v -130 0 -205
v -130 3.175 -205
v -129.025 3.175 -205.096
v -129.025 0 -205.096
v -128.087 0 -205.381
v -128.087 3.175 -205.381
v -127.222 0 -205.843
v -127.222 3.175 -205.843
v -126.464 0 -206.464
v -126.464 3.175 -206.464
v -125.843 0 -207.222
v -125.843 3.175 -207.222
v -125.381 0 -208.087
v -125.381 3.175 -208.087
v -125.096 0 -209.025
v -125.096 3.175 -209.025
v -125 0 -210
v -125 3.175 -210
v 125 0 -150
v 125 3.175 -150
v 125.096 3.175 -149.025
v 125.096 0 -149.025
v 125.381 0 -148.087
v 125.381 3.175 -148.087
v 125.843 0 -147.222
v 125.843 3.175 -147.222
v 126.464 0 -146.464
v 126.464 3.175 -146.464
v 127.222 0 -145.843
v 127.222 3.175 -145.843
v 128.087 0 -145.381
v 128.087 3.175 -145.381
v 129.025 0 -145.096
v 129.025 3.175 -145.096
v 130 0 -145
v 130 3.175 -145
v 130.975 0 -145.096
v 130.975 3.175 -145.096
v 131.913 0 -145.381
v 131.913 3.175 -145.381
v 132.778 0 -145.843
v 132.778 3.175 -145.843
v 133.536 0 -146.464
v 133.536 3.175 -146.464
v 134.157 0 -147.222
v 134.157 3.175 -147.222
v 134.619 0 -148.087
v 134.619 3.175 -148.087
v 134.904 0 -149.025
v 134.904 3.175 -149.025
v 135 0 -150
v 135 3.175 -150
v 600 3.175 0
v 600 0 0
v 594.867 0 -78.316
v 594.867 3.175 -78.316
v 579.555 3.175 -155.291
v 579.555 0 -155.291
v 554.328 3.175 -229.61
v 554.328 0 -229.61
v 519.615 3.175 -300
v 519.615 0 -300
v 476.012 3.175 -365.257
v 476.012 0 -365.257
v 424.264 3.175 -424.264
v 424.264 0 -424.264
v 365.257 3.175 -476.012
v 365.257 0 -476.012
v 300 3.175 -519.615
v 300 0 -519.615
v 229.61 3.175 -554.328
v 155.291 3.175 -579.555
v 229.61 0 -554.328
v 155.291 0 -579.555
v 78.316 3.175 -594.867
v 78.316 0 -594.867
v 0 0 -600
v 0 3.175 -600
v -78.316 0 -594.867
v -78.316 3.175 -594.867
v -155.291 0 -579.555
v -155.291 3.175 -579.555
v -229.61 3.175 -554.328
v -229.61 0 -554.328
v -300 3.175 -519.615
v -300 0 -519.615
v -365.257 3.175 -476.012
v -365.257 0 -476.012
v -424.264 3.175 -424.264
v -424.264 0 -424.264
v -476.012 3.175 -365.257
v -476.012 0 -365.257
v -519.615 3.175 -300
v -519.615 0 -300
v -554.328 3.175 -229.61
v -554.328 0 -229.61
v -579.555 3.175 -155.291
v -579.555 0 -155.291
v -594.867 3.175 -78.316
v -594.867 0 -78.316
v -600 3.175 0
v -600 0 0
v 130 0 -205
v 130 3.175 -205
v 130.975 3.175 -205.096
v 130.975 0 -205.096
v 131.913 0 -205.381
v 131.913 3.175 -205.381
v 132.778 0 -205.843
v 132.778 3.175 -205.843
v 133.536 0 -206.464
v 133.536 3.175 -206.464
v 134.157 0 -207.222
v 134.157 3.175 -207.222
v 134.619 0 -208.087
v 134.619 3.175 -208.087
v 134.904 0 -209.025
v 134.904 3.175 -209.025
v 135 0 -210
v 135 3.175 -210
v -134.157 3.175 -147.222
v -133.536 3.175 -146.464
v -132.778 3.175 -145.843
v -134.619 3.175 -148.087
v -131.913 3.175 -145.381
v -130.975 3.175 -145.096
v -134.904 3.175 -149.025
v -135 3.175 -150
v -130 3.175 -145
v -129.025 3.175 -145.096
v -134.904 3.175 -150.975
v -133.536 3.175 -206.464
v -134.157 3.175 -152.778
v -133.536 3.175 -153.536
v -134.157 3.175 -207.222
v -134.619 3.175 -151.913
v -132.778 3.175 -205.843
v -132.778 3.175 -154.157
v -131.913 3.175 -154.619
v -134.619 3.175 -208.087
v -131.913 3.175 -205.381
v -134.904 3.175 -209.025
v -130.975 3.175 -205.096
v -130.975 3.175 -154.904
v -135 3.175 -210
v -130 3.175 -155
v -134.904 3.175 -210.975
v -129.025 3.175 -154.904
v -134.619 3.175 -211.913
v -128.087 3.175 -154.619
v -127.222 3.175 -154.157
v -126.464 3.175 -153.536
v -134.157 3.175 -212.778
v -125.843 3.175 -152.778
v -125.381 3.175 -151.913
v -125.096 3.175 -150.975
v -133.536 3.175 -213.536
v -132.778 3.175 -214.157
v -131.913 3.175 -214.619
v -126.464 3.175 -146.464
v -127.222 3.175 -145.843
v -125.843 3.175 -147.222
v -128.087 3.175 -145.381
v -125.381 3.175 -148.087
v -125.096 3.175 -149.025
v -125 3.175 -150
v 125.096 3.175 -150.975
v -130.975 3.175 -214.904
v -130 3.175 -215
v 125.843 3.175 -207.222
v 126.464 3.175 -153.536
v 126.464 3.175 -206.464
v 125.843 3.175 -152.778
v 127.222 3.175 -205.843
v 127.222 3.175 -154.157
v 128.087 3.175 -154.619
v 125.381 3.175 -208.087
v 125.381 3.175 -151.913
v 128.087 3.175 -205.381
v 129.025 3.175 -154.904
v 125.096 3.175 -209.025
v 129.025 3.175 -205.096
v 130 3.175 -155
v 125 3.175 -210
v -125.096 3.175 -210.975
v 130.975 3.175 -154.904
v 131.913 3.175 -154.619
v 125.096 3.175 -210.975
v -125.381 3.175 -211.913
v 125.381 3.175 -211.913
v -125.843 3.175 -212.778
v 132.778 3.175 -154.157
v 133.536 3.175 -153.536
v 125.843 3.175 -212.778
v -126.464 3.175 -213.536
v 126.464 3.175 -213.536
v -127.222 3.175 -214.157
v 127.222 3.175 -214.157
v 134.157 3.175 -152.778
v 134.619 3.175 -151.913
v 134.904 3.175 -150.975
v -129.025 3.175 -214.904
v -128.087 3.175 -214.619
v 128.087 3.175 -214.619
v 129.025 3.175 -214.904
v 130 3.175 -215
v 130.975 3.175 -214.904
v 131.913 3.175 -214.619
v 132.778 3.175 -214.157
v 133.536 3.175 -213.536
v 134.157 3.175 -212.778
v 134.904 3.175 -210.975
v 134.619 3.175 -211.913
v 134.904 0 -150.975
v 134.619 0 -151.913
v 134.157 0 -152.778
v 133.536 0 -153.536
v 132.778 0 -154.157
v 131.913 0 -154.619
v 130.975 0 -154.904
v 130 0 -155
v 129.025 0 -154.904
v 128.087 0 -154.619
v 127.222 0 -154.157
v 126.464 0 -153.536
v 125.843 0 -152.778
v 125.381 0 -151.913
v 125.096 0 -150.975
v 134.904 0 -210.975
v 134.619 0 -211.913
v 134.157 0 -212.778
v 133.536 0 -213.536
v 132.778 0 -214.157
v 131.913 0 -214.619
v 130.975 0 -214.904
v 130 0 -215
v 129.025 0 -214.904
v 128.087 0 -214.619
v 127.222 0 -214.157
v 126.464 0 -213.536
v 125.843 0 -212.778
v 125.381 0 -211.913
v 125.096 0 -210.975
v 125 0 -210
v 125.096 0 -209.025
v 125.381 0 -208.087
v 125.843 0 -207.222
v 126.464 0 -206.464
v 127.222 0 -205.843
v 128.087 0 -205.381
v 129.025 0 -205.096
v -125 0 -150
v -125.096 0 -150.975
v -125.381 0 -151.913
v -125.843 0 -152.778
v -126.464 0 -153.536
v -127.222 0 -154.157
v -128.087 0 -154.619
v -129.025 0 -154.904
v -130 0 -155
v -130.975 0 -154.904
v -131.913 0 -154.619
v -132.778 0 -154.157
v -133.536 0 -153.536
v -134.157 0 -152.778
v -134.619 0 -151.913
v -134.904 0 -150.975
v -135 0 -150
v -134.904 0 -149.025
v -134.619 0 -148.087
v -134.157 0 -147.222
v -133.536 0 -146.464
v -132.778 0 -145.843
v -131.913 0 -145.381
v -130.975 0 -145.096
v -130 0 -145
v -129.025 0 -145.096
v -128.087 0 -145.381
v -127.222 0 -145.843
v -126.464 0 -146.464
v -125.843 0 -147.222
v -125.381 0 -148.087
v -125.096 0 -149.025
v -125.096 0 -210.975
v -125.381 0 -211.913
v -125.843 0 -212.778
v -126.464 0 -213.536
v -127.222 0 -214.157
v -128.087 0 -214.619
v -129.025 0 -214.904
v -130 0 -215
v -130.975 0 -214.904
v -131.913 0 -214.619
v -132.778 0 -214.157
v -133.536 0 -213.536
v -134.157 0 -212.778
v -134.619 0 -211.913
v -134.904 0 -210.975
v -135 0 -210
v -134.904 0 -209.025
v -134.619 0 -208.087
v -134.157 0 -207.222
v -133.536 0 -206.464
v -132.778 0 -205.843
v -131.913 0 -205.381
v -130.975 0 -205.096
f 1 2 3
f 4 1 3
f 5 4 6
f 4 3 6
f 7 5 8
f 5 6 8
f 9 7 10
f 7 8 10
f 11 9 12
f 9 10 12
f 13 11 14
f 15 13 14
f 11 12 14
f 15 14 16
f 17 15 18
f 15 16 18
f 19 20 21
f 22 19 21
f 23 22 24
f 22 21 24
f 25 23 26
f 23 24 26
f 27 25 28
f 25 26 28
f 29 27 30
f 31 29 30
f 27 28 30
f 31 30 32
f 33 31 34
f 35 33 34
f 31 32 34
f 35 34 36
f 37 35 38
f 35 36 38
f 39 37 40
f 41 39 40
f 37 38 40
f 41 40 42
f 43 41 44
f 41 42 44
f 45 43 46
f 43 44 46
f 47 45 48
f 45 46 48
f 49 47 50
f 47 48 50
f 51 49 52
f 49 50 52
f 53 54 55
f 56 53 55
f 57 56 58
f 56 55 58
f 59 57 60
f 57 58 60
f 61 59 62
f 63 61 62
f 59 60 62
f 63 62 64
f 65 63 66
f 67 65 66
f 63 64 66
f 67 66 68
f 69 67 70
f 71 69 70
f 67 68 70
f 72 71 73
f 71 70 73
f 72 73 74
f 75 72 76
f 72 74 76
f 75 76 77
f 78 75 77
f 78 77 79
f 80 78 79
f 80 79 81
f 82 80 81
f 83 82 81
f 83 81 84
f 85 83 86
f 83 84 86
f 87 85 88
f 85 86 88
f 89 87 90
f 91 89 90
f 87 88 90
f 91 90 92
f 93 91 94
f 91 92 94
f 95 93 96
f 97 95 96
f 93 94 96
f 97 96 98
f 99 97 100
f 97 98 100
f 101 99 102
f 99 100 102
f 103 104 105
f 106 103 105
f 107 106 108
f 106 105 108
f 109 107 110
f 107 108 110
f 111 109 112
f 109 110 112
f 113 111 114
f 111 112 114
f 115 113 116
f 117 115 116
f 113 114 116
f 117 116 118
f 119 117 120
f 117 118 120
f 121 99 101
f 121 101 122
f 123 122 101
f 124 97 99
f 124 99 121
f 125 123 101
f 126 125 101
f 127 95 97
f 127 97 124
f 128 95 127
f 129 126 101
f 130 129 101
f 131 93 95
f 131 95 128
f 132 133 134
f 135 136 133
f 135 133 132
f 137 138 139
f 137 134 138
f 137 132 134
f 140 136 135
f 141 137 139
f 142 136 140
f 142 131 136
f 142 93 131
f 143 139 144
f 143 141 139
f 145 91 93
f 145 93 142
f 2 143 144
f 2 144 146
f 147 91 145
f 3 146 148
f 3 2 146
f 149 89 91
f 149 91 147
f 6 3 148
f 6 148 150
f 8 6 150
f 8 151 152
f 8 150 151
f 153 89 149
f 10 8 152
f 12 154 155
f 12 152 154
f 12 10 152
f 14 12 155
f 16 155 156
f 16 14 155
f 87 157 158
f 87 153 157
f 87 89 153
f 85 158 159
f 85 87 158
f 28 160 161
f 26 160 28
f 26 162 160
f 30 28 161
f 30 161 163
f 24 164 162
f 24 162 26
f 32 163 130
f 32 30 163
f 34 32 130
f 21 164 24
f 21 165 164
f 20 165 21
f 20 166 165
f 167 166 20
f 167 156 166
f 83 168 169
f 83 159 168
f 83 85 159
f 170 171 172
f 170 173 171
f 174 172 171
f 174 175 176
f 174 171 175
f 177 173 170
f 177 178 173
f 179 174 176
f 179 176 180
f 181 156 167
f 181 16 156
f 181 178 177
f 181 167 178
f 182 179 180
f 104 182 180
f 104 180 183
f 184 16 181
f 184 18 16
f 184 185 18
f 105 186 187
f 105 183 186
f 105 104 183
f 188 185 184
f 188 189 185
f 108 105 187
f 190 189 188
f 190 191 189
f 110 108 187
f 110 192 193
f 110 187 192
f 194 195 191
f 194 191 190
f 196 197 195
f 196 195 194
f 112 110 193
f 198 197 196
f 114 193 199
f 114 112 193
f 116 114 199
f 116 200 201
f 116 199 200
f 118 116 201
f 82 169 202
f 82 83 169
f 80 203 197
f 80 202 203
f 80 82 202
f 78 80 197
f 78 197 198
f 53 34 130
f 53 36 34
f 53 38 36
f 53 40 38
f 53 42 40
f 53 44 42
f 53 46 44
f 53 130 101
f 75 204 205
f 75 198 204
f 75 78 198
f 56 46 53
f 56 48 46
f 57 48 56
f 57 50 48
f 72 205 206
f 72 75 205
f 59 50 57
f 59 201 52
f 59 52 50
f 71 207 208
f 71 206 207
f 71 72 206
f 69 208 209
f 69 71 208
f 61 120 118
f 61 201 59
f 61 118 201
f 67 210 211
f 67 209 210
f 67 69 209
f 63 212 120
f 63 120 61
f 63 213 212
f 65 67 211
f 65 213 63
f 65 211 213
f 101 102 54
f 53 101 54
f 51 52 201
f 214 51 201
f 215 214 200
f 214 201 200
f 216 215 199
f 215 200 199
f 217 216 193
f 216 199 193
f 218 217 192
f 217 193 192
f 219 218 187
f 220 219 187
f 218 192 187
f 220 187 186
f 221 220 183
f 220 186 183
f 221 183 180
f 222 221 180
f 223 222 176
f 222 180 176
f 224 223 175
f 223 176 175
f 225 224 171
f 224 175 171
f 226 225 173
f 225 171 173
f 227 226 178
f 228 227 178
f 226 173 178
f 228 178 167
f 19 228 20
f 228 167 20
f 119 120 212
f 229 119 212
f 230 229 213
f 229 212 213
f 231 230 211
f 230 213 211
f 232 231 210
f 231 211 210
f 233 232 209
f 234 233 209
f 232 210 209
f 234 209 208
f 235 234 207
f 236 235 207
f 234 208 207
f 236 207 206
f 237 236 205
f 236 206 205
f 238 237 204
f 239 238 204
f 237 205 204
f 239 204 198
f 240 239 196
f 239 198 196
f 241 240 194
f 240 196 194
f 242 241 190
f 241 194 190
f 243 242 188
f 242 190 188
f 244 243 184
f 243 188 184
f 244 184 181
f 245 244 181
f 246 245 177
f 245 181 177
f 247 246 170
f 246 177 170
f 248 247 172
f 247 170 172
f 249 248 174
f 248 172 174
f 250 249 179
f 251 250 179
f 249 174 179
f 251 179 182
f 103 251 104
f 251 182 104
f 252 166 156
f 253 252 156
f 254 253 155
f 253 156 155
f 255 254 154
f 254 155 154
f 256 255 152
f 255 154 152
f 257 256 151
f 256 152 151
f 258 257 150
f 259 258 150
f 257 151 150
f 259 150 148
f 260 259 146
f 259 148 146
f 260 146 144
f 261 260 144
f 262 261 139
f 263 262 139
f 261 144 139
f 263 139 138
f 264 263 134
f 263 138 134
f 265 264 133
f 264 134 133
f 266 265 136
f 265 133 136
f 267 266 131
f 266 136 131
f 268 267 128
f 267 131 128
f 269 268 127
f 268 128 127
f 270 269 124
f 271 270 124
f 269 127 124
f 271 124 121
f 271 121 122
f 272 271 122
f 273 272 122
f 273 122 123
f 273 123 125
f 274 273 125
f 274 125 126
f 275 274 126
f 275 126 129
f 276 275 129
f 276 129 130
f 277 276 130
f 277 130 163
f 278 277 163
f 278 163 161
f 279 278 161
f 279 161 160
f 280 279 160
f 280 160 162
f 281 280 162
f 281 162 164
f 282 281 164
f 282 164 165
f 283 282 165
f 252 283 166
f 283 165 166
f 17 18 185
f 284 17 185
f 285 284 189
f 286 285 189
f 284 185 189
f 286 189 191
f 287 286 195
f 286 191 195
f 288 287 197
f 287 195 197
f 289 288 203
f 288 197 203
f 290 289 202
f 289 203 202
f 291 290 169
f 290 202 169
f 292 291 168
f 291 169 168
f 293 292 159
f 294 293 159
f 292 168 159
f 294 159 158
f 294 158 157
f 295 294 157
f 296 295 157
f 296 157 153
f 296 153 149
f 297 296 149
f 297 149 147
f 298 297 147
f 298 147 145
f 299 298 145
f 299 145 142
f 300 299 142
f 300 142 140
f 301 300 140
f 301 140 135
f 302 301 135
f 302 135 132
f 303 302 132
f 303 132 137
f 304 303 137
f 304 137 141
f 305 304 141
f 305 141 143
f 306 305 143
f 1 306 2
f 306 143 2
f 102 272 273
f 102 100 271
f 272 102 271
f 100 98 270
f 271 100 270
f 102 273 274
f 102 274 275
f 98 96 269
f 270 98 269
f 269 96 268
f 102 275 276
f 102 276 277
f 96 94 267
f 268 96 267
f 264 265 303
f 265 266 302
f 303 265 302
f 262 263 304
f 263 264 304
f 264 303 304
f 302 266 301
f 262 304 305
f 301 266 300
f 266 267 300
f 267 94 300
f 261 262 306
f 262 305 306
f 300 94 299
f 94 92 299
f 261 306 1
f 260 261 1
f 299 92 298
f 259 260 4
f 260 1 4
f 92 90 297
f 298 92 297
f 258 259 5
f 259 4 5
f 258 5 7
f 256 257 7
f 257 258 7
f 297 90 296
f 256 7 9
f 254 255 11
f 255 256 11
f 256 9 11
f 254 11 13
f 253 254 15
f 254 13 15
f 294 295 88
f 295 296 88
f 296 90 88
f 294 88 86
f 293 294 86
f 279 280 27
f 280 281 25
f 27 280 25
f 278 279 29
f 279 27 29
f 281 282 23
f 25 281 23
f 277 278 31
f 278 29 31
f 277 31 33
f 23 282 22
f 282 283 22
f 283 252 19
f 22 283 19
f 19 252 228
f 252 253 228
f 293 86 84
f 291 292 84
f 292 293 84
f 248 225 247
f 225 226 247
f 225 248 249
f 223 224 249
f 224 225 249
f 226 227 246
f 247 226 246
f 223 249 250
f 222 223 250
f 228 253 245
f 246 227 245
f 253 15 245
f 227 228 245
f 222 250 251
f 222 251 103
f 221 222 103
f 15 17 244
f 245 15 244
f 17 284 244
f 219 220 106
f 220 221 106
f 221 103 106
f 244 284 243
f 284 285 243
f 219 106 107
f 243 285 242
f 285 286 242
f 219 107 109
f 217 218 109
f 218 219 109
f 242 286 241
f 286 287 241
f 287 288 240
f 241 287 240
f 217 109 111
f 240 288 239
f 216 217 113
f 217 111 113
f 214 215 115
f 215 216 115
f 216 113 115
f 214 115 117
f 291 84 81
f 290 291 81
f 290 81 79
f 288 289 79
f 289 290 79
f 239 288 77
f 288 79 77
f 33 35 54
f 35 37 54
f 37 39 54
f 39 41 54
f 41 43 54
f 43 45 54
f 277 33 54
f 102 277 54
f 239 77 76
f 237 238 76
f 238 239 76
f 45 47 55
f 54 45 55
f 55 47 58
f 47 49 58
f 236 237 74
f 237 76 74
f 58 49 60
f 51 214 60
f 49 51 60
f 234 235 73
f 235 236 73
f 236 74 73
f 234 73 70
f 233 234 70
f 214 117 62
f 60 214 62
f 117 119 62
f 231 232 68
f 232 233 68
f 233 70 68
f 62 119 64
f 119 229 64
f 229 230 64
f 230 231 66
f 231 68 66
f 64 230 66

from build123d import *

# Parameters (mm, degrees)
BOSS_EXTRUDE1_DEPTH = 3.175
CUT_EXTRUDE1_REACH  = 850.534


with BuildPart() as part:
    # Sketch1 → Boss-Extrude1 (new body)
    with BuildSketch(Plane(origin=(0, 0, 0), x_dir=(1, 0, 0), z_dir=(0, 1, 0))):
        with BuildLine():
            Line((-600, 0), (600, 0))
            ThreePointArc((600, 0), (0, 600), (-600, 0))
        make_face()
    extrude(amount=BOSS_EXTRUDE1_DEPTH)

    # Sketch2 → Cut-Extrude1 (cut, up to next)
    with BuildSketch(Plane(origin=(0, 3.175, 0), x_dir=(1, 0, 0), z_dir=(0, 1, 0)), mode=Mode.PRIVATE) as cut_extrude1_sk1:
        with BuildLine():
            Line((-130, 205), (-130, 210))
            Line((-130, 210), (-125, 210))
            ThreePointArc((-125, 210), (-133.535533906, 213.535533906), (-130, 205))
        make_face()
    cut_extrude1_tool1 = extrude(cut_extrude1_sk1.sketch, amount=-CUT_EXTRUDE1_REACH, mode=Mode.PRIVATE) & part.part
    # Sketch2 → Cut-Extrude1 (cut, up to next)
    with BuildSketch(Plane(origin=(0, 3.175, 0), x_dir=(1, 0, 0), z_dir=(0, 1, 0)), mode=Mode.PRIVATE) as cut_extrude1_sk2:
        with BuildLine():
            Line((-125, 210), (-130, 210))
            Line((-130, 210), (-130, 205))
            ThreePointArc((-130, 205), (-126.464466094, 206.464466094), (-125, 210))
        make_face()
    cut_extrude1_tool2 = extrude(cut_extrude1_sk2.sketch, amount=-CUT_EXTRUDE1_REACH, mode=Mode.PRIVATE) & part.part
    # Sketch2 → Cut-Extrude1 (cut, up to next)
    with BuildSketch(Plane(origin=(0, 3.175, 0), x_dir=(1, 0, 0), z_dir=(0, 1, 0)), mode=Mode.PRIVATE) as cut_extrude1_sk3:
        with BuildLine():
            Line((-130, 205), (-130, 210))
            Line((-130, 210), (-125, 210))
            ThreePointArc((-125, 210), (-133.535533906, 213.535533906), (-130, 205))
        make_face()
    cut_extrude1_tool3 = extrude(cut_extrude1_sk3.sketch, amount=-CUT_EXTRUDE1_REACH, mode=Mode.PRIVATE) & part.part
    # Sketch2 → Cut-Extrude1 (cut, up to next)
    with BuildSketch(Plane(origin=(0, 3.175, 0), x_dir=(1, 0, 0), z_dir=(0, 1, 0)), mode=Mode.PRIVATE) as cut_extrude1_sk4:
        with BuildLine():
            Line((-125, 210), (-130, 210))
            Line((-130, 210), (-130, 205))
            ThreePointArc((-130, 205), (-126.464466094, 206.464466094), (-125, 210))
        make_face()
    cut_extrude1_tool4 = extrude(cut_extrude1_sk4.sketch, amount=-CUT_EXTRUDE1_REACH, mode=Mode.PRIVATE) & part.part
    # Sketch2 → Cut-Extrude1 (cut, up to next)
    with BuildSketch(Plane(origin=(0, 3.175, 0), x_dir=(1, 0, 0), z_dir=(0, 1, 0)), mode=Mode.PRIVATE) as cut_extrude1_sk5:
        with BuildLine():
            ThreePointArc((-125, 150), (-126.464466094, 153.535533906), (-130, 155))
            Line((-130, 155), (-130, 150))
            Line((-130, 150), (-125, 150))
        make_face()
    cut_extrude1_tool5 = extrude(cut_extrude1_sk5.sketch, amount=-CUT_EXTRUDE1_REACH, mode=Mode.PRIVATE) & part.part
    # Sketch2 → Cut-Extrude1 (cut, up to next)
    with BuildSketch(Plane(origin=(0, 3.175, 0), x_dir=(1, 0, 0), z_dir=(0, 1, 0)), mode=Mode.PRIVATE) as cut_extrude1_sk6:
        with BuildLine():
            Line((-130, 150), (-130, 155))
            ThreePointArc((-130, 155), (-133.535533906, 146.464466094), (-125, 150))
            Line((-125, 150), (-130, 150))
        make_face()
    cut_extrude1_tool6 = extrude(cut_extrude1_sk6.sketch, amount=-CUT_EXTRUDE1_REACH, mode=Mode.PRIVATE) & part.part
    # Sketch2 → Cut-Extrude1 (cut, up to next)
    with BuildSketch(Plane(origin=(0, 3.175, 0), x_dir=(1, 0, 0), z_dir=(0, 1, 0)), mode=Mode.PRIVATE) as cut_extrude1_sk7:
        with BuildLine():
            ThreePointArc((-125, 150), (-126.464466094, 153.535533906), (-130, 155))
            Line((-130, 155), (-130, 150))
            Line((-130, 150), (-125, 150))
        make_face()
    cut_extrude1_tool7 = extrude(cut_extrude1_sk7.sketch, amount=-CUT_EXTRUDE1_REACH, mode=Mode.PRIVATE) & part.part
    # Sketch2 → Cut-Extrude1 (cut, up to next)
    with BuildSketch(Plane(origin=(0, 3.175, 0), x_dir=(1, 0, 0), z_dir=(0, 1, 0)), mode=Mode.PRIVATE) as cut_extrude1_sk8:
        with BuildLine():
            Line((-130, 150), (-130, 155))
            ThreePointArc((-130, 155), (-133.535533906, 146.464466094), (-125, 150))
            Line((-125, 150), (-130, 150))
        make_face()
    cut_extrude1_tool8 = extrude(cut_extrude1_sk8.sketch, amount=-CUT_EXTRUDE1_REACH, mode=Mode.PRIVATE) & part.part
    # Sketch2 → Cut-Extrude1 (cut, up to next)
    with BuildSketch(Plane(origin=(0, 3.175, 0), x_dir=(1, 0, 0), z_dir=(0, 1, 0)), mode=Mode.PRIVATE) as cut_extrude1_sk9:
        with BuildLine():
            ThreePointArc((135, 150), (133.535533906, 153.535533906), (130, 155))
            Line((130, 155), (130, 150))
            Line((130, 150), (125, 150))
            ThreePointArc((125, 150), (130, 145), (135, 150))
        make_face()
    cut_extrude1_tool9 = extrude(cut_extrude1_sk9.sketch, amount=-CUT_EXTRUDE1_REACH, mode=Mode.PRIVATE) & part.part
    # Sketch2 → Cut-Extrude1 (cut, up to next)
    with BuildSketch(Plane(origin=(0, 3.175, 0), x_dir=(1, 0, 0), z_dir=(0, 1, 0)), mode=Mode.PRIVATE) as cut_extrude1_sk10:
        with BuildLine():
            Line((130, 150), (130, 155))
            ThreePointArc((130, 155), (126.464466094, 153.535533906), (125, 150))
            Line((125, 150), (130, 150))
        make_face()
    cut_extrude1_tool10 = extrude(cut_extrude1_sk10.sketch, amount=-CUT_EXTRUDE1_REACH, mode=Mode.PRIVATE) & part.part
    # Sketch2 → Cut-Extrude1 (cut, up to next)
    with BuildSketch(Plane(origin=(0, 3.175, 0), x_dir=(1, 0, 0), z_dir=(0, 1, 0)), mode=Mode.PRIVATE) as cut_extrude1_sk11:
        with BuildLine():
            ThreePointArc((135, 150), (133.535533906, 153.535533906), (130, 155))
            Line((130, 155), (130, 150))
            Line((130, 150), (125, 150))
            ThreePointArc((125, 150), (130, 145), (135, 150))
        make_face()
    cut_extrude1_tool11 = extrude(cut_extrude1_sk11.sketch, amount=-CUT_EXTRUDE1_REACH, mode=Mode.PRIVATE) & part.part
    # Sketch2 → Cut-Extrude1 (cut, up to next)
    with BuildSketch(Plane(origin=(0, 3.175, 0), x_dir=(1, 0, 0), z_dir=(0, 1, 0)), mode=Mode.PRIVATE) as cut_extrude1_sk12:
        with BuildLine():
            Line((130, 150), (130, 155))
            ThreePointArc((130, 155), (126.464466094, 153.535533906), (125, 150))
            Line((125, 150), (130, 150))
        make_face()
    cut_extrude1_tool12 = extrude(cut_extrude1_sk12.sketch, amount=-CUT_EXTRUDE1_REACH, mode=Mode.PRIVATE) & part.part
    # Sketch2 → Cut-Extrude1 (cut, up to next)
    with BuildSketch(Plane(origin=(0, 3.175, 0), x_dir=(1, 0, 0), z_dir=(0, 1, 0)), mode=Mode.PRIVATE) as cut_extrude1_sk13:
        with BuildLine():
            ThreePointArc((135, 210), (130, 215), (125, 210))
            Line((125, 210), (130, 210))
            Line((130, 210), (130, 205))
            ThreePointArc((130, 205), (133.535533906, 206.464466094), (135, 210))
        make_face()
    cut_extrude1_tool13 = extrude(cut_extrude1_sk13.sketch, amount=-CUT_EXTRUDE1_REACH, mode=Mode.PRIVATE) & part.part
    # Sketch2 → Cut-Extrude1 (cut, up to next)
    with BuildSketch(Plane(origin=(0, 3.175, 0), x_dir=(1, 0, 0), z_dir=(0, 1, 0)), mode=Mode.PRIVATE) as cut_extrude1_sk14:
        with BuildLine():
            Line((130, 210), (125, 210))
            ThreePointArc((125, 210), (126.464466094, 206.464466094), (130, 205))
            Line((130, 205), (130, 210))
        make_face()
    cut_extrude1_tool14 = extrude(cut_extrude1_sk14.sketch, amount=-CUT_EXTRUDE1_REACH, mode=Mode.PRIVATE) & part.part
    # Sketch2 → Cut-Extrude1 (cut, up to next)
    with BuildSketch(Plane(origin=(0, 3.175, 0), x_dir=(1, 0, 0), z_dir=(0, 1, 0)), mode=Mode.PRIVATE) as cut_extrude1_sk15:
        with BuildLine():
            ThreePointArc((135, 210), (130, 215), (125, 210))
            Line((125, 210), (130, 210))
            Line((130, 210), (130, 205))
            ThreePointArc((130, 205), (133.535533906, 206.464466094), (135, 210))
        make_face()
    cut_extrude1_tool15 = extrude(cut_extrude1_sk15.sketch, amount=-CUT_EXTRUDE1_REACH, mode=Mode.PRIVATE) & part.part
    # Sketch2 → Cut-Extrude1 (cut, up to next)
    with BuildSketch(Plane(origin=(0, 3.175, 0), x_dir=(1, 0, 0), z_dir=(0, 1, 0)), mode=Mode.PRIVATE) as cut_extrude1_sk16:
        with BuildLine():
            Line((130, 210), (125, 210))
            ThreePointArc((125, 210), (126.464466094, 206.464466094), (130, 205))
            Line((130, 205), (130, 210))
        make_face()
    cut_extrude1_tool16 = extrude(cut_extrude1_sk16.sketch, amount=-CUT_EXTRUDE1_REACH, mode=Mode.PRIVATE) & part.part
    add(cut_extrude1_tool1.solids().sort_by_distance((-130.707355, 3.175, -210.707355))[0], mode=Mode.SUBTRACT)
    add(cut_extrude1_tool2.solids().sort_by_distance((-127.877934, 3.175, -207.877934))[0], mode=Mode.SUBTRACT)
    add(cut_extrude1_tool3.solids().sort_by_distance((-130.707355, 3.175, -210.707355))[0], mode=Mode.SUBTRACT)
    add(cut_extrude1_tool4.solids().sort_by_distance((-127.877934, 3.175, -207.877934))[0], mode=Mode.SUBTRACT)
    add(cut_extrude1_tool5.solids().sort_by_distance((-127.877934, 3.175, -152.122066))[0], mode=Mode.SUBTRACT)
    add(cut_extrude1_tool6.solids().sort_by_distance((-130.707355, 3.175, -149.292645))[0], mode=Mode.SUBTRACT)
    add(cut_extrude1_tool7.solids().sort_by_distance((-127.877934, 3.175, -152.122066))[0], mode=Mode.SUBTRACT)
    add(cut_extrude1_tool8.solids().sort_by_distance((-130.707355, 3.175, -149.292645))[0], mode=Mode.SUBTRACT)
    add(cut_extrude1_tool9.solids().sort_by_distance((130.707355, 3.175, -149.292645))[0], mode=Mode.SUBTRACT)
    add(cut_extrude1_tool10.solids().sort_by_distance((127.877934, 3.175, -152.122066))[0], mode=Mode.SUBTRACT)
    add(cut_extrude1_tool11.solids().sort_by_distance((130.707355, 3.175, -149.292645))[0], mode=Mode.SUBTRACT)
    add(cut_extrude1_tool12.solids().sort_by_distance((127.877934, 3.175, -152.122066))[0], mode=Mode.SUBTRACT)
    add(cut_extrude1_tool13.solids().sort_by_distance((130.707355, 3.175, -210.707355))[0], mode=Mode.SUBTRACT)
    add(cut_extrude1_tool14.solids().sort_by_distance((127.877934, 3.175, -207.877934))[0], mode=Mode.SUBTRACT)
    add(cut_extrude1_tool15.solids().sort_by_distance((130.707355, 3.175, -210.707355))[0], mode=Mode.SUBTRACT)
    add(cut_extrude1_tool16.solids().sort_by_distance((127.877934, 3.175, -207.877934))[0], mode=Mode.SUBTRACT)


solid = part.part
